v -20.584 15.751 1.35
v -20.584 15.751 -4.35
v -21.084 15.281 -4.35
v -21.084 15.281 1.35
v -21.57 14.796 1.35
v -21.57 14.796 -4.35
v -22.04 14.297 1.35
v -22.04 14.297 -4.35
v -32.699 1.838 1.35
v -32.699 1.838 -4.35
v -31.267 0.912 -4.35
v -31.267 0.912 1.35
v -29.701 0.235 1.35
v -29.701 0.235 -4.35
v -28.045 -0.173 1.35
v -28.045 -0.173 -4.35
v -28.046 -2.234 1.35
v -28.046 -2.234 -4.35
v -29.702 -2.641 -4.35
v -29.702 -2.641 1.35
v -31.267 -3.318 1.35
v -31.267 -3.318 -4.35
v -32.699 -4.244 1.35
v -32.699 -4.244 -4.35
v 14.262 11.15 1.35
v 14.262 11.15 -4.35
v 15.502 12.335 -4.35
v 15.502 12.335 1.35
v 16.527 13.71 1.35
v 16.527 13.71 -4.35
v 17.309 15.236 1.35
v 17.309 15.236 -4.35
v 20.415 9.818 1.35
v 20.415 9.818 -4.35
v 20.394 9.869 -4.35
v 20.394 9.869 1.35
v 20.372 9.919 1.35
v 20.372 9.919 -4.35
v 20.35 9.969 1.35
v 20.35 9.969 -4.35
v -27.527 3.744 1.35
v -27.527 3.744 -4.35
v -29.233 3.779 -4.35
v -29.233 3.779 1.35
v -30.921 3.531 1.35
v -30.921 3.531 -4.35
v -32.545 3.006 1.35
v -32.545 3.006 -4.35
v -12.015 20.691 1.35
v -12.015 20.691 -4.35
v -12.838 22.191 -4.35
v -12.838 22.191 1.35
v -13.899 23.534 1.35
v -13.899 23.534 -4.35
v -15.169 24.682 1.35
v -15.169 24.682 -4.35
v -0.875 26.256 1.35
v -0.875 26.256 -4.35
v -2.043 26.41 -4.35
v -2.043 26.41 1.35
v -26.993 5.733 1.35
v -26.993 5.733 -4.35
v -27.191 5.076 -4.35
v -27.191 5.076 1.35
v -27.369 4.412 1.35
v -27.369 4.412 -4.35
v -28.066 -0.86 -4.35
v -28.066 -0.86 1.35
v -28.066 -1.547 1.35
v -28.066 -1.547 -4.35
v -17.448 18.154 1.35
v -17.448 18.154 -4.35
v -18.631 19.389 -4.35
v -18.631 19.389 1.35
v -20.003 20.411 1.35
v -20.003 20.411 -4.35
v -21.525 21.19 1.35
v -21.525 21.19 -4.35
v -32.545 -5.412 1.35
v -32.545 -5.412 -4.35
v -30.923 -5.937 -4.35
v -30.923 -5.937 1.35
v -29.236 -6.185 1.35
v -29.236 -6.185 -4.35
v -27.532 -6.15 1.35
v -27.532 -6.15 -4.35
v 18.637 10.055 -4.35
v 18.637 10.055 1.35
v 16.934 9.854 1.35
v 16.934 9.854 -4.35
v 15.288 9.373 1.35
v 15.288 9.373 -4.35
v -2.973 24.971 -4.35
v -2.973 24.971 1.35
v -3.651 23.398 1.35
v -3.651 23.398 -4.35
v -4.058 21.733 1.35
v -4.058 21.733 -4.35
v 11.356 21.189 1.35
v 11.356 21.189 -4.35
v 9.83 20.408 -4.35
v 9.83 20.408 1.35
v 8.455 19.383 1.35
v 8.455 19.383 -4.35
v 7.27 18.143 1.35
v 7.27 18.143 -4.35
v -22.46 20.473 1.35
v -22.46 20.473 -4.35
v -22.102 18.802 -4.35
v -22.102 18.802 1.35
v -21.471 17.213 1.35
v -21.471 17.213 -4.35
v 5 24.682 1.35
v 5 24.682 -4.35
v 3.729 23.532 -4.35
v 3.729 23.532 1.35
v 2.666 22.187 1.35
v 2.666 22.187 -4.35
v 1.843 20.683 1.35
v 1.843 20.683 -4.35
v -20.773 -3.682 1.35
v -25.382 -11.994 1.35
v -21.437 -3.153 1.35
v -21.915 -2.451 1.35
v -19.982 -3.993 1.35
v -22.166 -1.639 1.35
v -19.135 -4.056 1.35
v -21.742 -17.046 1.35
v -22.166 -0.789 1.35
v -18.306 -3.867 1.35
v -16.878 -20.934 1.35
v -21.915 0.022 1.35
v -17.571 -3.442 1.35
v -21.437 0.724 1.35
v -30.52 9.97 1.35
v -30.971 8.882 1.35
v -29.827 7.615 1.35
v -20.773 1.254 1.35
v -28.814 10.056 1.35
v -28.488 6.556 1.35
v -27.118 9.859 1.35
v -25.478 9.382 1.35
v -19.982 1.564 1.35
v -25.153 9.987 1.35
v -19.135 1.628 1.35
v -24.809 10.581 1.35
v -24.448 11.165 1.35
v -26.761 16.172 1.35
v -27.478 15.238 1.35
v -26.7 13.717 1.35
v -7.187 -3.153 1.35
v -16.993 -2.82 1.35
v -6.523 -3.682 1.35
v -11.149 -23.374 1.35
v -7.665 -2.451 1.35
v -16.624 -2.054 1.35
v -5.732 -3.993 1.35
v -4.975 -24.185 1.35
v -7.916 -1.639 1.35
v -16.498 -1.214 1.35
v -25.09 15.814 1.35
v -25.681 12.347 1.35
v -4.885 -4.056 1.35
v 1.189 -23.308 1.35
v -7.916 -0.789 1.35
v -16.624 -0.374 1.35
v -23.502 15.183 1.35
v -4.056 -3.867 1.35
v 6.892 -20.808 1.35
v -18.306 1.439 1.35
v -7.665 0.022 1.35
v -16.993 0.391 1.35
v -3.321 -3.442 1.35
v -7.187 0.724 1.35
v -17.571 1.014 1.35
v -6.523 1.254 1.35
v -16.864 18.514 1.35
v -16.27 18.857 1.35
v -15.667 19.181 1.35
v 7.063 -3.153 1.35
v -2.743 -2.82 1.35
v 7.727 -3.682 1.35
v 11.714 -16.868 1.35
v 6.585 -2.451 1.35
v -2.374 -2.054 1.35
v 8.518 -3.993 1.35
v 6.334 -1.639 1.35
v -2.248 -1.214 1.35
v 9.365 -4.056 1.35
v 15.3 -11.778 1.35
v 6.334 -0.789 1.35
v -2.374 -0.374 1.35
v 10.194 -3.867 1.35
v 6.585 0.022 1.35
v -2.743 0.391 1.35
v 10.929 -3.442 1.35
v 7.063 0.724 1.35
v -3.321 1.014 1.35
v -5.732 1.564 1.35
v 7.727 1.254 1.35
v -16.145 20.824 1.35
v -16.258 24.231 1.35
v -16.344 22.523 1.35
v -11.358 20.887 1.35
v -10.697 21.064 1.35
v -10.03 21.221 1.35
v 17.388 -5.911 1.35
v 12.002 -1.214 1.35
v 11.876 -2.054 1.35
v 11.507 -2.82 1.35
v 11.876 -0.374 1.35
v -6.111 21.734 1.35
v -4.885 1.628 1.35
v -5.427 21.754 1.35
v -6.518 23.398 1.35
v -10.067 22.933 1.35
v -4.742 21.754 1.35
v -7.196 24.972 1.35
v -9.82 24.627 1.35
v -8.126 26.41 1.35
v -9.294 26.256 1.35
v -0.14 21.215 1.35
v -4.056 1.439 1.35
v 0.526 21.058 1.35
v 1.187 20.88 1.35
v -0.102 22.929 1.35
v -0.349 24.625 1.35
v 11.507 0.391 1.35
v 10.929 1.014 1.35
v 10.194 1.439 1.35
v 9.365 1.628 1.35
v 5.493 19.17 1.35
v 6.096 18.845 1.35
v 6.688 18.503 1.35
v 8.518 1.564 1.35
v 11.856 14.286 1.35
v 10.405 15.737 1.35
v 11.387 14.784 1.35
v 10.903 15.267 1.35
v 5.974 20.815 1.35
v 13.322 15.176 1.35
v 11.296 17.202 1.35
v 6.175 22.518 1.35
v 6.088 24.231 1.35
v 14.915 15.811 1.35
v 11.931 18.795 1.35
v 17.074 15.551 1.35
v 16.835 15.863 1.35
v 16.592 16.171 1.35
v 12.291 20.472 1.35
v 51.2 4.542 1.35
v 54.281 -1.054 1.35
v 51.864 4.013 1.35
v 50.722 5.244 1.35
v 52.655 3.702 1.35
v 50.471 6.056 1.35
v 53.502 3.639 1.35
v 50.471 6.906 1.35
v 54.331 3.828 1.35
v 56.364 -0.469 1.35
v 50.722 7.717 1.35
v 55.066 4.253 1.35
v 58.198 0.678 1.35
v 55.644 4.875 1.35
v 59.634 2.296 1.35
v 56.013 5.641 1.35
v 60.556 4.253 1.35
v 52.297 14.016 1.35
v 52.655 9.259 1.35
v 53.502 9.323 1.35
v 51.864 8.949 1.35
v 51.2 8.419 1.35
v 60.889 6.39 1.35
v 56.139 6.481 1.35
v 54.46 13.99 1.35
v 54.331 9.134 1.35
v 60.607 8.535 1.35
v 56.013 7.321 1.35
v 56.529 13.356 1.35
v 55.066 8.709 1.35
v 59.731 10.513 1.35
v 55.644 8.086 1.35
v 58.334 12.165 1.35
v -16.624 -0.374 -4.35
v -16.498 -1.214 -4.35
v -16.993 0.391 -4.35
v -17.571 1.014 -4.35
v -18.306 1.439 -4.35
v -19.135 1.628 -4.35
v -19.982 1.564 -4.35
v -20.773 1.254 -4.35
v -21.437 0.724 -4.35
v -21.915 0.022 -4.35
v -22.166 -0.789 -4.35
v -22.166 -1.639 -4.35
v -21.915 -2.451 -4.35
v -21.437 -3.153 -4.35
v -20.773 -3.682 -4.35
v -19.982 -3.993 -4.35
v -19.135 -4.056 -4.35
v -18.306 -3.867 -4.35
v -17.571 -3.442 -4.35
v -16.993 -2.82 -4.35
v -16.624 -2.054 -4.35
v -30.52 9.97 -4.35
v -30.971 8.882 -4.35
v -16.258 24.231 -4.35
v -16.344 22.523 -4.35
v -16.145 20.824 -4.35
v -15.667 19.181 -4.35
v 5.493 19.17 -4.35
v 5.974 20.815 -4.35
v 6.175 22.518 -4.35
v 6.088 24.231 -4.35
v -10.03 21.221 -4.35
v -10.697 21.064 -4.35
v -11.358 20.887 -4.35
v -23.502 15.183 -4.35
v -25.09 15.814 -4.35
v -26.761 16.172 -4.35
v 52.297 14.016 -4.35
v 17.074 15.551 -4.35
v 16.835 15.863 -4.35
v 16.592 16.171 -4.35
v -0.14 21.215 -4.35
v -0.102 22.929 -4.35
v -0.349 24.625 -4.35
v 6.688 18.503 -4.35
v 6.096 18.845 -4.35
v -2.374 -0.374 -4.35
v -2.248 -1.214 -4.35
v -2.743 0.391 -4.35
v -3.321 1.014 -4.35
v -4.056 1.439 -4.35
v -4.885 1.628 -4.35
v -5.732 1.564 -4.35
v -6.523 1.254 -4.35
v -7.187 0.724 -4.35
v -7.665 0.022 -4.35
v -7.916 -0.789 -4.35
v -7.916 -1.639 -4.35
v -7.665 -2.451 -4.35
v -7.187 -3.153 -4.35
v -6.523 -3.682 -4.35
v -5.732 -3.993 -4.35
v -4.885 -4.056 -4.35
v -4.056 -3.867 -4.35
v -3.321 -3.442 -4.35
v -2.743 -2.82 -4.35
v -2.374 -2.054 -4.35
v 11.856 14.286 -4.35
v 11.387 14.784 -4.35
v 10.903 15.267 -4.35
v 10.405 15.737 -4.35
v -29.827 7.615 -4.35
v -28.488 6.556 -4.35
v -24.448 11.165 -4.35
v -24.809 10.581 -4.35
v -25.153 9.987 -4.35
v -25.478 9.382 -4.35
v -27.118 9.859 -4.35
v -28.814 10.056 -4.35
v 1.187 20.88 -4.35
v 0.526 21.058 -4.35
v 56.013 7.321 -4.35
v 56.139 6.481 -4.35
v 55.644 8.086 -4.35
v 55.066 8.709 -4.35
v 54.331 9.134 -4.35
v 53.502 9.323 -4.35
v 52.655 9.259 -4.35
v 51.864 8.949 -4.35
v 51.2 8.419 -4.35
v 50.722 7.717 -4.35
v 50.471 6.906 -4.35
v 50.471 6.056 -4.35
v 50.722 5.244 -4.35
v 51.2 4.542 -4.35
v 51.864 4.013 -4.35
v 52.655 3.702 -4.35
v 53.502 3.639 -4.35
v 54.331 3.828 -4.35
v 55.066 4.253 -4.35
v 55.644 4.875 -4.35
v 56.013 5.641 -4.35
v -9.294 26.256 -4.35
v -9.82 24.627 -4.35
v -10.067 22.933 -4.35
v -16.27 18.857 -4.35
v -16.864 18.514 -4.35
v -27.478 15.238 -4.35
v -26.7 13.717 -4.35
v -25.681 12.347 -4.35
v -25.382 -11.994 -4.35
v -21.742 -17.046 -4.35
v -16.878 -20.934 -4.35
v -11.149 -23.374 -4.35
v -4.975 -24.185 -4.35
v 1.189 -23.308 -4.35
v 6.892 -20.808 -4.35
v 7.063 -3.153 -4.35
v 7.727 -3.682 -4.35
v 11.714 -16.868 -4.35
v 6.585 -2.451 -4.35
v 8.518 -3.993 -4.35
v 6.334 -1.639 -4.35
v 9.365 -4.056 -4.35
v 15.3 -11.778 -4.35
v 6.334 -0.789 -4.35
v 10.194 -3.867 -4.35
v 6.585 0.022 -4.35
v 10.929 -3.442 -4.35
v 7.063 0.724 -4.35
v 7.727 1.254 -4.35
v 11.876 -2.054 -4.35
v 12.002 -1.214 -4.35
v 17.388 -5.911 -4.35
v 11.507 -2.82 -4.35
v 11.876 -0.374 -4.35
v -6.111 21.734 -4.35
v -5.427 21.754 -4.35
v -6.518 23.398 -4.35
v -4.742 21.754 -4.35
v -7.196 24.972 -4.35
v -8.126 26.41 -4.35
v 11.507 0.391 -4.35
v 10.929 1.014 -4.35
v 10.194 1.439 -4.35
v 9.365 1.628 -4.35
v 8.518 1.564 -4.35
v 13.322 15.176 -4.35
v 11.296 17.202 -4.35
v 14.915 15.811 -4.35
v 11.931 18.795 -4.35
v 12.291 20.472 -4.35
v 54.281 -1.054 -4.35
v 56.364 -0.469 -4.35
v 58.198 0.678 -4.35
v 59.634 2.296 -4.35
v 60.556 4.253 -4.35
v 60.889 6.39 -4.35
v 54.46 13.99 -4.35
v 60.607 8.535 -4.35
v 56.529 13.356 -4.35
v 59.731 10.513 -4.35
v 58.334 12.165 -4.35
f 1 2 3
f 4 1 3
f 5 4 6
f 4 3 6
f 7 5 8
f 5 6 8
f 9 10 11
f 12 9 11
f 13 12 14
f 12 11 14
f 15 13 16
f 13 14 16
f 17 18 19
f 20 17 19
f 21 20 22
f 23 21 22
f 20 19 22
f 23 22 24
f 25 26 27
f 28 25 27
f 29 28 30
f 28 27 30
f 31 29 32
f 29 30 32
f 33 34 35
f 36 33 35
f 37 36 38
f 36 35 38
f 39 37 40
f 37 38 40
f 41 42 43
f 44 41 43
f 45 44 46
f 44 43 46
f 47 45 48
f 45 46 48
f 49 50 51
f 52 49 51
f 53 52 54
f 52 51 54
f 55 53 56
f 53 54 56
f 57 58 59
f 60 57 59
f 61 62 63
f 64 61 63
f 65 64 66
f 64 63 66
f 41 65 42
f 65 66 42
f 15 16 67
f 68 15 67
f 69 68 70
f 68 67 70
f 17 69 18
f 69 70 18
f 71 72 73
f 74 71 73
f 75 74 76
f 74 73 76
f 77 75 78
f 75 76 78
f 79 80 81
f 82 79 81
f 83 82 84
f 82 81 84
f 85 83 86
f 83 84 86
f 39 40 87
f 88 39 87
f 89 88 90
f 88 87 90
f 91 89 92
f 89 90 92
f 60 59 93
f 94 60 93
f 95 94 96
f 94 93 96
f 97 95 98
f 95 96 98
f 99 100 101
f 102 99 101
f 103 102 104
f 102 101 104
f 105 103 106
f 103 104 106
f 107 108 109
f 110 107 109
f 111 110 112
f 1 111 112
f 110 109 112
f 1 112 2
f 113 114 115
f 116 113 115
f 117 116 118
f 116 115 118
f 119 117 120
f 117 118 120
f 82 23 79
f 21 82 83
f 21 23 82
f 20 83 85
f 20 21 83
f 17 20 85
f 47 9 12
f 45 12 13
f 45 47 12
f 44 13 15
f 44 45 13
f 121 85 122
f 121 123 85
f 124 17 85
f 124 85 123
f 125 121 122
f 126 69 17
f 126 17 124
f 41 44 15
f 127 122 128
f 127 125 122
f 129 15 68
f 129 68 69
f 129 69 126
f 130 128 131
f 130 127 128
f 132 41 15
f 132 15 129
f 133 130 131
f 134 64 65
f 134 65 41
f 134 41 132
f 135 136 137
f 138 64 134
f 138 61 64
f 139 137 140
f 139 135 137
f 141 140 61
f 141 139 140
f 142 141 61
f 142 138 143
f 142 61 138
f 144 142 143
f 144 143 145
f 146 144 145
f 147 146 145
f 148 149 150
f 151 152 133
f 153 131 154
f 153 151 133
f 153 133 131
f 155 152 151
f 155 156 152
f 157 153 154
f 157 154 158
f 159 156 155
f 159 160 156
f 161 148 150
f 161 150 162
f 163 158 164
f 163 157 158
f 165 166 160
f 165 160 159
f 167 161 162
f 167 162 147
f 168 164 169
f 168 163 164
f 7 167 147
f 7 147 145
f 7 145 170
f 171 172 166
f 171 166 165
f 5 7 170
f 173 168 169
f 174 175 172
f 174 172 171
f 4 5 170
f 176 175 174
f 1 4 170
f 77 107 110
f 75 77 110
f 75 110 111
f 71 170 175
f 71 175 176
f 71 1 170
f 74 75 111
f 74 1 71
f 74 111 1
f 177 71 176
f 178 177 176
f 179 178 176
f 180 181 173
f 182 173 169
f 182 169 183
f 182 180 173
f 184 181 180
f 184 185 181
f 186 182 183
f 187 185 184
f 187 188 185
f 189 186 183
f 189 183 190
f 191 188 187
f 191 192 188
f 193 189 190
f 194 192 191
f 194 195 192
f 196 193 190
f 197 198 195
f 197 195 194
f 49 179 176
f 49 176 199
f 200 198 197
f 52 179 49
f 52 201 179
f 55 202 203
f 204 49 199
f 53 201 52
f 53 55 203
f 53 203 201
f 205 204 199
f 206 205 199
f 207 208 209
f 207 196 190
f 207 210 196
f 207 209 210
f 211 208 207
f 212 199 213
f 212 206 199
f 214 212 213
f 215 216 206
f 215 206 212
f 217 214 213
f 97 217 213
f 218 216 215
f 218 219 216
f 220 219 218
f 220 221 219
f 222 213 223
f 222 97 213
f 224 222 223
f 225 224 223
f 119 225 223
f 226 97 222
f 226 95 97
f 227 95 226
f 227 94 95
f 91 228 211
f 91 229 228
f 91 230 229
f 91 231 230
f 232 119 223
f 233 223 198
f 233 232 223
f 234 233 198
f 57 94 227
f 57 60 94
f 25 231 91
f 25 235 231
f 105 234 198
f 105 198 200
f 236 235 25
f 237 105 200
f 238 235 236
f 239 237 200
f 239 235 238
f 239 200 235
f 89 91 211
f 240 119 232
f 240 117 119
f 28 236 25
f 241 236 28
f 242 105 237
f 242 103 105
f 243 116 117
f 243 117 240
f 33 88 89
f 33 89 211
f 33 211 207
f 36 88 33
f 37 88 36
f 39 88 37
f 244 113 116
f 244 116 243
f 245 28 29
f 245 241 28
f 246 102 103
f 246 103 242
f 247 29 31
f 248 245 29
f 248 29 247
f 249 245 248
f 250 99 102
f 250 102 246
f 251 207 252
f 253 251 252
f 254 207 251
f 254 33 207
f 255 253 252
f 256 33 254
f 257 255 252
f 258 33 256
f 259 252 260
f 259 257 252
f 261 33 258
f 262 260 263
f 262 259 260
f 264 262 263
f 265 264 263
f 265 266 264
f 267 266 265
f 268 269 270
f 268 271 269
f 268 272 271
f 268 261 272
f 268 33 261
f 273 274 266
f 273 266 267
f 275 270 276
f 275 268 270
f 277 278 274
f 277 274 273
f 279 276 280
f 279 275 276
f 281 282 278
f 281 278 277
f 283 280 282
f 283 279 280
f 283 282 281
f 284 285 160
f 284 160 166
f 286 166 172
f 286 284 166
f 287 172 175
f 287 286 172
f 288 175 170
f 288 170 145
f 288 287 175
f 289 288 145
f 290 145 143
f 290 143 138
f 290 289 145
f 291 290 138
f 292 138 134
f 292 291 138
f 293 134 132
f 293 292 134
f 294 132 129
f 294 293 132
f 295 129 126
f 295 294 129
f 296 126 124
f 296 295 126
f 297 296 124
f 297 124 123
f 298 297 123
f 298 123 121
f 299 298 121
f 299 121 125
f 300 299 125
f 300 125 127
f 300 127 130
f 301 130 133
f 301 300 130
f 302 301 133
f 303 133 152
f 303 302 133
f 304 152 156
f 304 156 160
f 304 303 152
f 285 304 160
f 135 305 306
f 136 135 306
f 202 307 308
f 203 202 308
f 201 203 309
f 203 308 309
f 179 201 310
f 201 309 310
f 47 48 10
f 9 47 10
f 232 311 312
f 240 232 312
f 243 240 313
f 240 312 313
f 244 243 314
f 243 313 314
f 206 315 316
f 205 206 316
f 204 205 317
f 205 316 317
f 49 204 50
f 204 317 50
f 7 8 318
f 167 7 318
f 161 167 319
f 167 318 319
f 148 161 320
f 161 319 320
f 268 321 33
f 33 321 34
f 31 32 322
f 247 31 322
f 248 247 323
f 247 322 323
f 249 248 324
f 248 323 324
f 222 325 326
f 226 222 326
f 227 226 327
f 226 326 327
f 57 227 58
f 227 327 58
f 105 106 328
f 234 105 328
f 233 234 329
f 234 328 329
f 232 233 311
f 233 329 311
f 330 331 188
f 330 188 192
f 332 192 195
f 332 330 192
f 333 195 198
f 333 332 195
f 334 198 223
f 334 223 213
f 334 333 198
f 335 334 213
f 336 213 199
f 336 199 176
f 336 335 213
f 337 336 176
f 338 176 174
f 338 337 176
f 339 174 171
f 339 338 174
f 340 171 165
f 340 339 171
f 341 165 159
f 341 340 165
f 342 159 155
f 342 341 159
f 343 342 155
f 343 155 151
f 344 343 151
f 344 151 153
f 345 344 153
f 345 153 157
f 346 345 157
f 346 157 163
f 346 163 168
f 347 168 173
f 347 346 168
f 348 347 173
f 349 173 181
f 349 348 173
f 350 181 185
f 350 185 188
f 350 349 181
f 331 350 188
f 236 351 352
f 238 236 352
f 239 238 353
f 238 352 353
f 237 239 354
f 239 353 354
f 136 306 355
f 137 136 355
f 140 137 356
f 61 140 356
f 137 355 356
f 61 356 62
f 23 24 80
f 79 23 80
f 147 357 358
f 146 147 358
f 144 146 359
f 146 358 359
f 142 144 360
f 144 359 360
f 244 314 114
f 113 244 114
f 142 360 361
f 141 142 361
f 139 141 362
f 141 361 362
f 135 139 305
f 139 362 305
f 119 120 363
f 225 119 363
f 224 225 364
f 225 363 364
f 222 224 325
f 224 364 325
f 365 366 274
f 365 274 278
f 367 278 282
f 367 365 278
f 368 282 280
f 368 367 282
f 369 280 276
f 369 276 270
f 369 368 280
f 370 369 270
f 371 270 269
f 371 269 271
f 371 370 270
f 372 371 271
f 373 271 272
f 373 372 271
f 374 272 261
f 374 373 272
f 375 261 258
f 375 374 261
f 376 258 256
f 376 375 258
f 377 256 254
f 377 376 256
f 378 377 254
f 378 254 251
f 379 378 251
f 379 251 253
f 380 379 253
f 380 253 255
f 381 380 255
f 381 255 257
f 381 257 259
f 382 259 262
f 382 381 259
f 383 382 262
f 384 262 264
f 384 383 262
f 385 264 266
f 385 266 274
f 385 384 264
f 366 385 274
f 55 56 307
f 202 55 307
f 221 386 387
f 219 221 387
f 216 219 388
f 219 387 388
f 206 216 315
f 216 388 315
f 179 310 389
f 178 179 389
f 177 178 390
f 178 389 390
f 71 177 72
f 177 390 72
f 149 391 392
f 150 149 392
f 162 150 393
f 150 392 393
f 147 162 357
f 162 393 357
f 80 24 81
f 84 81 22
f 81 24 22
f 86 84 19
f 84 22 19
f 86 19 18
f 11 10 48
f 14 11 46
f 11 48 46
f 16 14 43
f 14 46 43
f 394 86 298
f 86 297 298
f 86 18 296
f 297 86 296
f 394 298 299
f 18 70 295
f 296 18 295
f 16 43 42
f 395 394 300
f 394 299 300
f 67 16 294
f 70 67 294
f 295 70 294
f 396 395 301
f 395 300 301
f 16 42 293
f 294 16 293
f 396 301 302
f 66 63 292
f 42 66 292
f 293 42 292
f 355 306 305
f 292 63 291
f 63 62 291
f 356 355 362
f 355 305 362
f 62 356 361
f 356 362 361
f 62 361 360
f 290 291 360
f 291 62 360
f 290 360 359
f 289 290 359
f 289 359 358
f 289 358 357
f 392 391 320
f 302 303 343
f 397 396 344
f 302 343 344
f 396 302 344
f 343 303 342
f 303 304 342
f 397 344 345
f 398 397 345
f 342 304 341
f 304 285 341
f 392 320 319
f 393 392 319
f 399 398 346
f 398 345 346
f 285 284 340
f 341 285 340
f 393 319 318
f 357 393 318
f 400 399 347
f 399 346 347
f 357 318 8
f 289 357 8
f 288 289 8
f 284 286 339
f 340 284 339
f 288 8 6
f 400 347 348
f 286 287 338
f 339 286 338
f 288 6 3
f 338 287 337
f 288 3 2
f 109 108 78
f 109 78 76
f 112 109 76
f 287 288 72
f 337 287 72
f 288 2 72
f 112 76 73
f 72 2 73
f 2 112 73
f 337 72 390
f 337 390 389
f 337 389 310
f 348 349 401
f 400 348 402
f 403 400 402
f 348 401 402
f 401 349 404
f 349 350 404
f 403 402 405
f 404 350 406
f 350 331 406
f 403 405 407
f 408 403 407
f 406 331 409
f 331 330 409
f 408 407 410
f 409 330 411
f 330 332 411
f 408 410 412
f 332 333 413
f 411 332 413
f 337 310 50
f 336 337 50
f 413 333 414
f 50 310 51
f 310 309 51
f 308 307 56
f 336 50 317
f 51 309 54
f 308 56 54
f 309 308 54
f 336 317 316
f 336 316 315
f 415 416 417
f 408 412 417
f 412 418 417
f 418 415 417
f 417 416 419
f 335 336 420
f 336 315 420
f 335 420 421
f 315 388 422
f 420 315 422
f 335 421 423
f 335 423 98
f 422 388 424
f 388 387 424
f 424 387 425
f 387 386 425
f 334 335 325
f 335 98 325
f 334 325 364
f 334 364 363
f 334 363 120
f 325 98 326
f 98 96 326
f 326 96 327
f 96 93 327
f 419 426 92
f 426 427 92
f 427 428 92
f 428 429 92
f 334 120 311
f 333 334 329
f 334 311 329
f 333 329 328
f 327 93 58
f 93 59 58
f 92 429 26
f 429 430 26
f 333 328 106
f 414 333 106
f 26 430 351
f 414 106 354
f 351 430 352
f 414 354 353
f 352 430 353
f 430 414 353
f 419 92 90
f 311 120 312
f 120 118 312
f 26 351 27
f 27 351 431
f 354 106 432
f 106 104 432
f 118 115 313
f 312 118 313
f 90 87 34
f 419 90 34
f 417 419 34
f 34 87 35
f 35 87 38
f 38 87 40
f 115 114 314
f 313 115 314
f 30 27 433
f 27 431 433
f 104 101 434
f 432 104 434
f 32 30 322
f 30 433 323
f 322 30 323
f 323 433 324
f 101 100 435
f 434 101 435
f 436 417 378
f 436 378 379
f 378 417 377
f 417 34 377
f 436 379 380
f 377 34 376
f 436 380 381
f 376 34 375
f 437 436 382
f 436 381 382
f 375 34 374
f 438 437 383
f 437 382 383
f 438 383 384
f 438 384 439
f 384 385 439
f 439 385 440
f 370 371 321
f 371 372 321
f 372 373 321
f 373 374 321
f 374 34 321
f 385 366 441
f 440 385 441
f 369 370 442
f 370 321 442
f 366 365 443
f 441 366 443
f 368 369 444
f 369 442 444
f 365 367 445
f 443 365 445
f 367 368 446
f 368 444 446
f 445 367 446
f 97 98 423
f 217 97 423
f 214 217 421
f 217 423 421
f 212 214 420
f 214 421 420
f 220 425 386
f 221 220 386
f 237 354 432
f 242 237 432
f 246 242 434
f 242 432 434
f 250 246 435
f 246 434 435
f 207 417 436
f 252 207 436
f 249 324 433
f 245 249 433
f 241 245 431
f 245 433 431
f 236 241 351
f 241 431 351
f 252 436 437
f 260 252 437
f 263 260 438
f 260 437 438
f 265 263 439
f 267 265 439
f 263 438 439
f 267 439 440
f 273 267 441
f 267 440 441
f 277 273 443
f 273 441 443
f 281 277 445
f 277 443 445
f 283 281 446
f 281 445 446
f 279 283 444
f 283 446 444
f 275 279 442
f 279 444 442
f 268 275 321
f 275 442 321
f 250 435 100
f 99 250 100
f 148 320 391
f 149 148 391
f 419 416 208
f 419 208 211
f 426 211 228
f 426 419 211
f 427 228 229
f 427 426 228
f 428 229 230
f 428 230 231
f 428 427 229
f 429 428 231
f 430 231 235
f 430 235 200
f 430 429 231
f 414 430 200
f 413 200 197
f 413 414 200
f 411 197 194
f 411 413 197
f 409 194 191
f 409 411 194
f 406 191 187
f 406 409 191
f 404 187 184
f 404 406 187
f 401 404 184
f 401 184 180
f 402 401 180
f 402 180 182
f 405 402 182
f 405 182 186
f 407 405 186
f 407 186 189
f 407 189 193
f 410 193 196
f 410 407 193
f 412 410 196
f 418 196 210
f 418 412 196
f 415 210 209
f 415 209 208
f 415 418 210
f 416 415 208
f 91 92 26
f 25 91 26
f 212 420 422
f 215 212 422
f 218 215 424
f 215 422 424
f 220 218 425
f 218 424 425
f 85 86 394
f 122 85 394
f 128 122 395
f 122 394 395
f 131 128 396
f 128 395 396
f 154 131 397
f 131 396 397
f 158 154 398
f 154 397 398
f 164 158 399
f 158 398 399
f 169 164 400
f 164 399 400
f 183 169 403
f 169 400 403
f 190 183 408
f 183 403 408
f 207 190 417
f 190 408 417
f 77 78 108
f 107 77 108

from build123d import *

# Parameters (mm, degrees)
BOSS_EXTRUDE1_START     = -3
BOSS_EXTRUDE1_OUTLINE_R = 1.5
BOSS_EXTRUDE1_DEPTH     = 3
SCALE1_SCALE            = 1.9


# Read off the part's stored shape, not the designer's step: Boss-Extrude1
with BuildPart() as part:
    # Boss-Extrude1 outline → Boss-Extrude1 (new body)
    with BuildSketch(Plane.XY.offset(BOSS_EXTRUDE1_START)):
        with BuildLine():
            Line((11.834550238, -2.472148997), (31.252104769, 0.084220555))
            ThreePointArc((31.252104769, 0.084220555), (34.695779445, 4.572104769), (30.207895231, 8.015779445))
            Line((30.207895231, 8.015779445), (13.427938823, 5.806656275))
            ThreePointArc((13.427938823, 5.806656275), (13.410760304, 5.846221532), (13.393465207, 5.885735968))
            ThreePointArc((13.393465207, 5.885735968), (12.041551488, 5.897071585), (10.729192217, 5.572244952))
            Line((10.729192217, 5.572244952), (10.189200244, 6.507557022))
            ThreePointArc((10.189200244, 6.507557022), (11.126720661, 7.481723913), (11.792869471, 8.658240563))
            ThreePointArc((11.792869471, 8.658240563), (11.606759368, 8.906179706), (11.415437385, 9.150119633))
            ThreePointArc((11.415437385, 9.150119633), (10.106597569, 8.81117421), (8.922976471, 8.15773197))
            ThreePointArc((8.922976471, 8.15773197), (8.549706323, 8.548135574), (8.159371308, 8.921477448))
            ThreePointArc((8.159371308, 8.921477448), (8.812813548, 10.105098546), (9.151758972, 11.413938362))
            Line((9.151758972, 11.413938362), (8.659879901, 11.791370448))
            ThreePointArc((8.659879901, 11.791370448), (7.483516811, 11.125336137), (6.509436976, 10.187999326))
            ThreePointArc((6.509436976, 10.187999326), (6.047829045, 10.468613272), (5.574146563, 10.728326528))
            ThreePointArc((5.574146563, 10.728326528), (5.898805358, 12.040487702), (5.887415057, 13.392168338))
            Line((5.887415057, 13.392168338), (5.314609747, 13.629432066))
            ThreePointArc((5.314609747, 13.629432066), (4.351003751, 12.681995862), (3.65280527, 11.524977816))
            ThreePointArc((3.65280527, 11.524977816), (3.134170467, 11.676689406), (2.609274564, 11.805074597))
            ThreePointArc((2.609274564, 11.805074597), (2.58305967, 13.15599481), (2.222297371, 14.458117388))
            Line((2.222297371, 14.458117388), (1.607601557, 14.539043627))
            ThreePointArc((1.607601557, 14.539043627), (0.922327421, 13.375148622), (0.547316802, 12.077605074))
            ThreePointArc((0.547316802, 12.077605074), (0.006856042, 12.089998056), (-0.533618427, 12.078218055))
            ThreePointArc((-0.533618427, 12.078218055), (-0.908651119, 13.375486662), (-1.593822374, 14.539142845))
            Line((-1.593822374, 14.539142845), (-2.208518188, 14.458216606))
            ThreePointArc((-2.208518188, 14.458216606), (-2.569071942, 13.157522433), (-2.595800172, 11.808044777))
            ThreePointArc((-2.595800172, 11.808044777), (-3.121351418, 11.680122659), (-3.640655008, 11.528821757))
            ThreePointArc((-3.640655008, 11.528821757), (-4.338480819, 12.683812024), (-5.300881923, 13.629722958))
            Line((-5.300881923, 13.629722958), (-5.873687233, 13.39245923))
            ThreePointArc((-5.873687233, 13.39245923), (-5.885433032, 12.043808909), (-5.562611018, 10.734312212))
            ThreePointArc((-5.562611018, 10.734312212), (-6.037455135, 10.474599539), (-6.500199913, 10.193895285))
            ThreePointArc((-6.500199913, 10.193895285), (-7.47268922, 11.127885908), (-8.646251294, 11.791833189))
            Line((-8.646251294, 11.791833189), (-9.138130365, 11.414401103))
            ThreePointArc((-9.138130365, 11.414401103), (-8.80083054, 10.109699304), (-8.150983569, 8.92914144))
            ThreePointArc((-8.150983569, 8.92914144), (-8.542690029, 8.555147402), (-8.917254459, 8.163986338))
            ThreePointArc((-8.917254459, 8.163986338), (-10.097571821, 8.813551755), (-11.401949093, 9.15072269))
            Line((-11.401949093, 9.15072269), (-11.779381179, 8.658843619))
            ThreePointArc((-11.779381179, 8.658843619), (-11.116550367, 7.486781519), (-10.184349411, 6.515145975))
            ThreePointArc((-10.184349411, 6.515145975), (-10.46607819, 6.052215075), (-10.726778871, 5.577124264))
            ThreePointArc((-10.726778871, 5.577124264), (-12.034053776, 5.89841947), (-13.38017907, 5.886378776))
            Line((-13.38017907, 5.886378776), (-13.617442798, 5.313573465))
            ThreePointArc((-13.617442798, 5.313573465), (-12.674640857, 4.353631081), (-11.523783462, 3.656571444))
            ThreePointArc((-11.523783462, 3.656571444), (-11.67614775, 3.13618777), (-11.805025713, 2.60949572))
            ThreePointArc((-11.805025713, 2.60949572), (-13.149945407, 2.581153618), (-14.44612812, 2.221261089))
            Line((-14.44612812, 2.221261089), (-14.527054359, 1.606565275))
            ThreePointArc((-14.527054359, 1.606565275), (-13.368714152, 0.923687604), (-12.07756623, 0.548173302))
            ThreePointArc((-12.07756623, 0.548173302), (-12.089998597, 0.005825389), (-12.07808888, -0.536534252))
            ThreePointArc((-12.07808888, -0.536534252), (-13.369010177, -0.912066026), (-14.527153576, -1.594858655))
            Line((-14.527153576, -1.594858655), (-14.446227337, -2.20955447))
            ThreePointArc((-14.446227337, -2.20955447), (-13.151251636, -2.569269431), (-11.807551859, -2.598041398))
            ThreePointArc((-11.807551859, -2.598041398), (0.06437742, -12.089828599), (11.834550238, -2.472148997))
        make_face()
        with Locations((-7.5, 0)):
            Circle(BOSS_EXTRUDE1_OUTLINE_R, mode=Mode.SUBTRACT)
        Circle(BOSS_EXTRUDE1_OUTLINE_R, mode=Mode.SUBTRACT)
        with Locations((7.5, 0)):
            Circle(BOSS_EXTRUDE1_OUTLINE_R, mode=Mode.SUBTRACT)
        with Locations((30.73, 4.05)):
            Circle(BOSS_EXTRUDE1_OUTLINE_R, mode=Mode.SUBTRACT)
    extrude(amount=BOSS_EXTRUDE1_DEPTH)


with BuildPart() as part_1:
    # Scale1: scaled about (5.663998646, 1.349090427, -1.5)
    add(part.part.scale(SCALE1_SCALE).moved(Location((-5.097598781, -1.214181384, 1.35))))


solid = part_1.part
